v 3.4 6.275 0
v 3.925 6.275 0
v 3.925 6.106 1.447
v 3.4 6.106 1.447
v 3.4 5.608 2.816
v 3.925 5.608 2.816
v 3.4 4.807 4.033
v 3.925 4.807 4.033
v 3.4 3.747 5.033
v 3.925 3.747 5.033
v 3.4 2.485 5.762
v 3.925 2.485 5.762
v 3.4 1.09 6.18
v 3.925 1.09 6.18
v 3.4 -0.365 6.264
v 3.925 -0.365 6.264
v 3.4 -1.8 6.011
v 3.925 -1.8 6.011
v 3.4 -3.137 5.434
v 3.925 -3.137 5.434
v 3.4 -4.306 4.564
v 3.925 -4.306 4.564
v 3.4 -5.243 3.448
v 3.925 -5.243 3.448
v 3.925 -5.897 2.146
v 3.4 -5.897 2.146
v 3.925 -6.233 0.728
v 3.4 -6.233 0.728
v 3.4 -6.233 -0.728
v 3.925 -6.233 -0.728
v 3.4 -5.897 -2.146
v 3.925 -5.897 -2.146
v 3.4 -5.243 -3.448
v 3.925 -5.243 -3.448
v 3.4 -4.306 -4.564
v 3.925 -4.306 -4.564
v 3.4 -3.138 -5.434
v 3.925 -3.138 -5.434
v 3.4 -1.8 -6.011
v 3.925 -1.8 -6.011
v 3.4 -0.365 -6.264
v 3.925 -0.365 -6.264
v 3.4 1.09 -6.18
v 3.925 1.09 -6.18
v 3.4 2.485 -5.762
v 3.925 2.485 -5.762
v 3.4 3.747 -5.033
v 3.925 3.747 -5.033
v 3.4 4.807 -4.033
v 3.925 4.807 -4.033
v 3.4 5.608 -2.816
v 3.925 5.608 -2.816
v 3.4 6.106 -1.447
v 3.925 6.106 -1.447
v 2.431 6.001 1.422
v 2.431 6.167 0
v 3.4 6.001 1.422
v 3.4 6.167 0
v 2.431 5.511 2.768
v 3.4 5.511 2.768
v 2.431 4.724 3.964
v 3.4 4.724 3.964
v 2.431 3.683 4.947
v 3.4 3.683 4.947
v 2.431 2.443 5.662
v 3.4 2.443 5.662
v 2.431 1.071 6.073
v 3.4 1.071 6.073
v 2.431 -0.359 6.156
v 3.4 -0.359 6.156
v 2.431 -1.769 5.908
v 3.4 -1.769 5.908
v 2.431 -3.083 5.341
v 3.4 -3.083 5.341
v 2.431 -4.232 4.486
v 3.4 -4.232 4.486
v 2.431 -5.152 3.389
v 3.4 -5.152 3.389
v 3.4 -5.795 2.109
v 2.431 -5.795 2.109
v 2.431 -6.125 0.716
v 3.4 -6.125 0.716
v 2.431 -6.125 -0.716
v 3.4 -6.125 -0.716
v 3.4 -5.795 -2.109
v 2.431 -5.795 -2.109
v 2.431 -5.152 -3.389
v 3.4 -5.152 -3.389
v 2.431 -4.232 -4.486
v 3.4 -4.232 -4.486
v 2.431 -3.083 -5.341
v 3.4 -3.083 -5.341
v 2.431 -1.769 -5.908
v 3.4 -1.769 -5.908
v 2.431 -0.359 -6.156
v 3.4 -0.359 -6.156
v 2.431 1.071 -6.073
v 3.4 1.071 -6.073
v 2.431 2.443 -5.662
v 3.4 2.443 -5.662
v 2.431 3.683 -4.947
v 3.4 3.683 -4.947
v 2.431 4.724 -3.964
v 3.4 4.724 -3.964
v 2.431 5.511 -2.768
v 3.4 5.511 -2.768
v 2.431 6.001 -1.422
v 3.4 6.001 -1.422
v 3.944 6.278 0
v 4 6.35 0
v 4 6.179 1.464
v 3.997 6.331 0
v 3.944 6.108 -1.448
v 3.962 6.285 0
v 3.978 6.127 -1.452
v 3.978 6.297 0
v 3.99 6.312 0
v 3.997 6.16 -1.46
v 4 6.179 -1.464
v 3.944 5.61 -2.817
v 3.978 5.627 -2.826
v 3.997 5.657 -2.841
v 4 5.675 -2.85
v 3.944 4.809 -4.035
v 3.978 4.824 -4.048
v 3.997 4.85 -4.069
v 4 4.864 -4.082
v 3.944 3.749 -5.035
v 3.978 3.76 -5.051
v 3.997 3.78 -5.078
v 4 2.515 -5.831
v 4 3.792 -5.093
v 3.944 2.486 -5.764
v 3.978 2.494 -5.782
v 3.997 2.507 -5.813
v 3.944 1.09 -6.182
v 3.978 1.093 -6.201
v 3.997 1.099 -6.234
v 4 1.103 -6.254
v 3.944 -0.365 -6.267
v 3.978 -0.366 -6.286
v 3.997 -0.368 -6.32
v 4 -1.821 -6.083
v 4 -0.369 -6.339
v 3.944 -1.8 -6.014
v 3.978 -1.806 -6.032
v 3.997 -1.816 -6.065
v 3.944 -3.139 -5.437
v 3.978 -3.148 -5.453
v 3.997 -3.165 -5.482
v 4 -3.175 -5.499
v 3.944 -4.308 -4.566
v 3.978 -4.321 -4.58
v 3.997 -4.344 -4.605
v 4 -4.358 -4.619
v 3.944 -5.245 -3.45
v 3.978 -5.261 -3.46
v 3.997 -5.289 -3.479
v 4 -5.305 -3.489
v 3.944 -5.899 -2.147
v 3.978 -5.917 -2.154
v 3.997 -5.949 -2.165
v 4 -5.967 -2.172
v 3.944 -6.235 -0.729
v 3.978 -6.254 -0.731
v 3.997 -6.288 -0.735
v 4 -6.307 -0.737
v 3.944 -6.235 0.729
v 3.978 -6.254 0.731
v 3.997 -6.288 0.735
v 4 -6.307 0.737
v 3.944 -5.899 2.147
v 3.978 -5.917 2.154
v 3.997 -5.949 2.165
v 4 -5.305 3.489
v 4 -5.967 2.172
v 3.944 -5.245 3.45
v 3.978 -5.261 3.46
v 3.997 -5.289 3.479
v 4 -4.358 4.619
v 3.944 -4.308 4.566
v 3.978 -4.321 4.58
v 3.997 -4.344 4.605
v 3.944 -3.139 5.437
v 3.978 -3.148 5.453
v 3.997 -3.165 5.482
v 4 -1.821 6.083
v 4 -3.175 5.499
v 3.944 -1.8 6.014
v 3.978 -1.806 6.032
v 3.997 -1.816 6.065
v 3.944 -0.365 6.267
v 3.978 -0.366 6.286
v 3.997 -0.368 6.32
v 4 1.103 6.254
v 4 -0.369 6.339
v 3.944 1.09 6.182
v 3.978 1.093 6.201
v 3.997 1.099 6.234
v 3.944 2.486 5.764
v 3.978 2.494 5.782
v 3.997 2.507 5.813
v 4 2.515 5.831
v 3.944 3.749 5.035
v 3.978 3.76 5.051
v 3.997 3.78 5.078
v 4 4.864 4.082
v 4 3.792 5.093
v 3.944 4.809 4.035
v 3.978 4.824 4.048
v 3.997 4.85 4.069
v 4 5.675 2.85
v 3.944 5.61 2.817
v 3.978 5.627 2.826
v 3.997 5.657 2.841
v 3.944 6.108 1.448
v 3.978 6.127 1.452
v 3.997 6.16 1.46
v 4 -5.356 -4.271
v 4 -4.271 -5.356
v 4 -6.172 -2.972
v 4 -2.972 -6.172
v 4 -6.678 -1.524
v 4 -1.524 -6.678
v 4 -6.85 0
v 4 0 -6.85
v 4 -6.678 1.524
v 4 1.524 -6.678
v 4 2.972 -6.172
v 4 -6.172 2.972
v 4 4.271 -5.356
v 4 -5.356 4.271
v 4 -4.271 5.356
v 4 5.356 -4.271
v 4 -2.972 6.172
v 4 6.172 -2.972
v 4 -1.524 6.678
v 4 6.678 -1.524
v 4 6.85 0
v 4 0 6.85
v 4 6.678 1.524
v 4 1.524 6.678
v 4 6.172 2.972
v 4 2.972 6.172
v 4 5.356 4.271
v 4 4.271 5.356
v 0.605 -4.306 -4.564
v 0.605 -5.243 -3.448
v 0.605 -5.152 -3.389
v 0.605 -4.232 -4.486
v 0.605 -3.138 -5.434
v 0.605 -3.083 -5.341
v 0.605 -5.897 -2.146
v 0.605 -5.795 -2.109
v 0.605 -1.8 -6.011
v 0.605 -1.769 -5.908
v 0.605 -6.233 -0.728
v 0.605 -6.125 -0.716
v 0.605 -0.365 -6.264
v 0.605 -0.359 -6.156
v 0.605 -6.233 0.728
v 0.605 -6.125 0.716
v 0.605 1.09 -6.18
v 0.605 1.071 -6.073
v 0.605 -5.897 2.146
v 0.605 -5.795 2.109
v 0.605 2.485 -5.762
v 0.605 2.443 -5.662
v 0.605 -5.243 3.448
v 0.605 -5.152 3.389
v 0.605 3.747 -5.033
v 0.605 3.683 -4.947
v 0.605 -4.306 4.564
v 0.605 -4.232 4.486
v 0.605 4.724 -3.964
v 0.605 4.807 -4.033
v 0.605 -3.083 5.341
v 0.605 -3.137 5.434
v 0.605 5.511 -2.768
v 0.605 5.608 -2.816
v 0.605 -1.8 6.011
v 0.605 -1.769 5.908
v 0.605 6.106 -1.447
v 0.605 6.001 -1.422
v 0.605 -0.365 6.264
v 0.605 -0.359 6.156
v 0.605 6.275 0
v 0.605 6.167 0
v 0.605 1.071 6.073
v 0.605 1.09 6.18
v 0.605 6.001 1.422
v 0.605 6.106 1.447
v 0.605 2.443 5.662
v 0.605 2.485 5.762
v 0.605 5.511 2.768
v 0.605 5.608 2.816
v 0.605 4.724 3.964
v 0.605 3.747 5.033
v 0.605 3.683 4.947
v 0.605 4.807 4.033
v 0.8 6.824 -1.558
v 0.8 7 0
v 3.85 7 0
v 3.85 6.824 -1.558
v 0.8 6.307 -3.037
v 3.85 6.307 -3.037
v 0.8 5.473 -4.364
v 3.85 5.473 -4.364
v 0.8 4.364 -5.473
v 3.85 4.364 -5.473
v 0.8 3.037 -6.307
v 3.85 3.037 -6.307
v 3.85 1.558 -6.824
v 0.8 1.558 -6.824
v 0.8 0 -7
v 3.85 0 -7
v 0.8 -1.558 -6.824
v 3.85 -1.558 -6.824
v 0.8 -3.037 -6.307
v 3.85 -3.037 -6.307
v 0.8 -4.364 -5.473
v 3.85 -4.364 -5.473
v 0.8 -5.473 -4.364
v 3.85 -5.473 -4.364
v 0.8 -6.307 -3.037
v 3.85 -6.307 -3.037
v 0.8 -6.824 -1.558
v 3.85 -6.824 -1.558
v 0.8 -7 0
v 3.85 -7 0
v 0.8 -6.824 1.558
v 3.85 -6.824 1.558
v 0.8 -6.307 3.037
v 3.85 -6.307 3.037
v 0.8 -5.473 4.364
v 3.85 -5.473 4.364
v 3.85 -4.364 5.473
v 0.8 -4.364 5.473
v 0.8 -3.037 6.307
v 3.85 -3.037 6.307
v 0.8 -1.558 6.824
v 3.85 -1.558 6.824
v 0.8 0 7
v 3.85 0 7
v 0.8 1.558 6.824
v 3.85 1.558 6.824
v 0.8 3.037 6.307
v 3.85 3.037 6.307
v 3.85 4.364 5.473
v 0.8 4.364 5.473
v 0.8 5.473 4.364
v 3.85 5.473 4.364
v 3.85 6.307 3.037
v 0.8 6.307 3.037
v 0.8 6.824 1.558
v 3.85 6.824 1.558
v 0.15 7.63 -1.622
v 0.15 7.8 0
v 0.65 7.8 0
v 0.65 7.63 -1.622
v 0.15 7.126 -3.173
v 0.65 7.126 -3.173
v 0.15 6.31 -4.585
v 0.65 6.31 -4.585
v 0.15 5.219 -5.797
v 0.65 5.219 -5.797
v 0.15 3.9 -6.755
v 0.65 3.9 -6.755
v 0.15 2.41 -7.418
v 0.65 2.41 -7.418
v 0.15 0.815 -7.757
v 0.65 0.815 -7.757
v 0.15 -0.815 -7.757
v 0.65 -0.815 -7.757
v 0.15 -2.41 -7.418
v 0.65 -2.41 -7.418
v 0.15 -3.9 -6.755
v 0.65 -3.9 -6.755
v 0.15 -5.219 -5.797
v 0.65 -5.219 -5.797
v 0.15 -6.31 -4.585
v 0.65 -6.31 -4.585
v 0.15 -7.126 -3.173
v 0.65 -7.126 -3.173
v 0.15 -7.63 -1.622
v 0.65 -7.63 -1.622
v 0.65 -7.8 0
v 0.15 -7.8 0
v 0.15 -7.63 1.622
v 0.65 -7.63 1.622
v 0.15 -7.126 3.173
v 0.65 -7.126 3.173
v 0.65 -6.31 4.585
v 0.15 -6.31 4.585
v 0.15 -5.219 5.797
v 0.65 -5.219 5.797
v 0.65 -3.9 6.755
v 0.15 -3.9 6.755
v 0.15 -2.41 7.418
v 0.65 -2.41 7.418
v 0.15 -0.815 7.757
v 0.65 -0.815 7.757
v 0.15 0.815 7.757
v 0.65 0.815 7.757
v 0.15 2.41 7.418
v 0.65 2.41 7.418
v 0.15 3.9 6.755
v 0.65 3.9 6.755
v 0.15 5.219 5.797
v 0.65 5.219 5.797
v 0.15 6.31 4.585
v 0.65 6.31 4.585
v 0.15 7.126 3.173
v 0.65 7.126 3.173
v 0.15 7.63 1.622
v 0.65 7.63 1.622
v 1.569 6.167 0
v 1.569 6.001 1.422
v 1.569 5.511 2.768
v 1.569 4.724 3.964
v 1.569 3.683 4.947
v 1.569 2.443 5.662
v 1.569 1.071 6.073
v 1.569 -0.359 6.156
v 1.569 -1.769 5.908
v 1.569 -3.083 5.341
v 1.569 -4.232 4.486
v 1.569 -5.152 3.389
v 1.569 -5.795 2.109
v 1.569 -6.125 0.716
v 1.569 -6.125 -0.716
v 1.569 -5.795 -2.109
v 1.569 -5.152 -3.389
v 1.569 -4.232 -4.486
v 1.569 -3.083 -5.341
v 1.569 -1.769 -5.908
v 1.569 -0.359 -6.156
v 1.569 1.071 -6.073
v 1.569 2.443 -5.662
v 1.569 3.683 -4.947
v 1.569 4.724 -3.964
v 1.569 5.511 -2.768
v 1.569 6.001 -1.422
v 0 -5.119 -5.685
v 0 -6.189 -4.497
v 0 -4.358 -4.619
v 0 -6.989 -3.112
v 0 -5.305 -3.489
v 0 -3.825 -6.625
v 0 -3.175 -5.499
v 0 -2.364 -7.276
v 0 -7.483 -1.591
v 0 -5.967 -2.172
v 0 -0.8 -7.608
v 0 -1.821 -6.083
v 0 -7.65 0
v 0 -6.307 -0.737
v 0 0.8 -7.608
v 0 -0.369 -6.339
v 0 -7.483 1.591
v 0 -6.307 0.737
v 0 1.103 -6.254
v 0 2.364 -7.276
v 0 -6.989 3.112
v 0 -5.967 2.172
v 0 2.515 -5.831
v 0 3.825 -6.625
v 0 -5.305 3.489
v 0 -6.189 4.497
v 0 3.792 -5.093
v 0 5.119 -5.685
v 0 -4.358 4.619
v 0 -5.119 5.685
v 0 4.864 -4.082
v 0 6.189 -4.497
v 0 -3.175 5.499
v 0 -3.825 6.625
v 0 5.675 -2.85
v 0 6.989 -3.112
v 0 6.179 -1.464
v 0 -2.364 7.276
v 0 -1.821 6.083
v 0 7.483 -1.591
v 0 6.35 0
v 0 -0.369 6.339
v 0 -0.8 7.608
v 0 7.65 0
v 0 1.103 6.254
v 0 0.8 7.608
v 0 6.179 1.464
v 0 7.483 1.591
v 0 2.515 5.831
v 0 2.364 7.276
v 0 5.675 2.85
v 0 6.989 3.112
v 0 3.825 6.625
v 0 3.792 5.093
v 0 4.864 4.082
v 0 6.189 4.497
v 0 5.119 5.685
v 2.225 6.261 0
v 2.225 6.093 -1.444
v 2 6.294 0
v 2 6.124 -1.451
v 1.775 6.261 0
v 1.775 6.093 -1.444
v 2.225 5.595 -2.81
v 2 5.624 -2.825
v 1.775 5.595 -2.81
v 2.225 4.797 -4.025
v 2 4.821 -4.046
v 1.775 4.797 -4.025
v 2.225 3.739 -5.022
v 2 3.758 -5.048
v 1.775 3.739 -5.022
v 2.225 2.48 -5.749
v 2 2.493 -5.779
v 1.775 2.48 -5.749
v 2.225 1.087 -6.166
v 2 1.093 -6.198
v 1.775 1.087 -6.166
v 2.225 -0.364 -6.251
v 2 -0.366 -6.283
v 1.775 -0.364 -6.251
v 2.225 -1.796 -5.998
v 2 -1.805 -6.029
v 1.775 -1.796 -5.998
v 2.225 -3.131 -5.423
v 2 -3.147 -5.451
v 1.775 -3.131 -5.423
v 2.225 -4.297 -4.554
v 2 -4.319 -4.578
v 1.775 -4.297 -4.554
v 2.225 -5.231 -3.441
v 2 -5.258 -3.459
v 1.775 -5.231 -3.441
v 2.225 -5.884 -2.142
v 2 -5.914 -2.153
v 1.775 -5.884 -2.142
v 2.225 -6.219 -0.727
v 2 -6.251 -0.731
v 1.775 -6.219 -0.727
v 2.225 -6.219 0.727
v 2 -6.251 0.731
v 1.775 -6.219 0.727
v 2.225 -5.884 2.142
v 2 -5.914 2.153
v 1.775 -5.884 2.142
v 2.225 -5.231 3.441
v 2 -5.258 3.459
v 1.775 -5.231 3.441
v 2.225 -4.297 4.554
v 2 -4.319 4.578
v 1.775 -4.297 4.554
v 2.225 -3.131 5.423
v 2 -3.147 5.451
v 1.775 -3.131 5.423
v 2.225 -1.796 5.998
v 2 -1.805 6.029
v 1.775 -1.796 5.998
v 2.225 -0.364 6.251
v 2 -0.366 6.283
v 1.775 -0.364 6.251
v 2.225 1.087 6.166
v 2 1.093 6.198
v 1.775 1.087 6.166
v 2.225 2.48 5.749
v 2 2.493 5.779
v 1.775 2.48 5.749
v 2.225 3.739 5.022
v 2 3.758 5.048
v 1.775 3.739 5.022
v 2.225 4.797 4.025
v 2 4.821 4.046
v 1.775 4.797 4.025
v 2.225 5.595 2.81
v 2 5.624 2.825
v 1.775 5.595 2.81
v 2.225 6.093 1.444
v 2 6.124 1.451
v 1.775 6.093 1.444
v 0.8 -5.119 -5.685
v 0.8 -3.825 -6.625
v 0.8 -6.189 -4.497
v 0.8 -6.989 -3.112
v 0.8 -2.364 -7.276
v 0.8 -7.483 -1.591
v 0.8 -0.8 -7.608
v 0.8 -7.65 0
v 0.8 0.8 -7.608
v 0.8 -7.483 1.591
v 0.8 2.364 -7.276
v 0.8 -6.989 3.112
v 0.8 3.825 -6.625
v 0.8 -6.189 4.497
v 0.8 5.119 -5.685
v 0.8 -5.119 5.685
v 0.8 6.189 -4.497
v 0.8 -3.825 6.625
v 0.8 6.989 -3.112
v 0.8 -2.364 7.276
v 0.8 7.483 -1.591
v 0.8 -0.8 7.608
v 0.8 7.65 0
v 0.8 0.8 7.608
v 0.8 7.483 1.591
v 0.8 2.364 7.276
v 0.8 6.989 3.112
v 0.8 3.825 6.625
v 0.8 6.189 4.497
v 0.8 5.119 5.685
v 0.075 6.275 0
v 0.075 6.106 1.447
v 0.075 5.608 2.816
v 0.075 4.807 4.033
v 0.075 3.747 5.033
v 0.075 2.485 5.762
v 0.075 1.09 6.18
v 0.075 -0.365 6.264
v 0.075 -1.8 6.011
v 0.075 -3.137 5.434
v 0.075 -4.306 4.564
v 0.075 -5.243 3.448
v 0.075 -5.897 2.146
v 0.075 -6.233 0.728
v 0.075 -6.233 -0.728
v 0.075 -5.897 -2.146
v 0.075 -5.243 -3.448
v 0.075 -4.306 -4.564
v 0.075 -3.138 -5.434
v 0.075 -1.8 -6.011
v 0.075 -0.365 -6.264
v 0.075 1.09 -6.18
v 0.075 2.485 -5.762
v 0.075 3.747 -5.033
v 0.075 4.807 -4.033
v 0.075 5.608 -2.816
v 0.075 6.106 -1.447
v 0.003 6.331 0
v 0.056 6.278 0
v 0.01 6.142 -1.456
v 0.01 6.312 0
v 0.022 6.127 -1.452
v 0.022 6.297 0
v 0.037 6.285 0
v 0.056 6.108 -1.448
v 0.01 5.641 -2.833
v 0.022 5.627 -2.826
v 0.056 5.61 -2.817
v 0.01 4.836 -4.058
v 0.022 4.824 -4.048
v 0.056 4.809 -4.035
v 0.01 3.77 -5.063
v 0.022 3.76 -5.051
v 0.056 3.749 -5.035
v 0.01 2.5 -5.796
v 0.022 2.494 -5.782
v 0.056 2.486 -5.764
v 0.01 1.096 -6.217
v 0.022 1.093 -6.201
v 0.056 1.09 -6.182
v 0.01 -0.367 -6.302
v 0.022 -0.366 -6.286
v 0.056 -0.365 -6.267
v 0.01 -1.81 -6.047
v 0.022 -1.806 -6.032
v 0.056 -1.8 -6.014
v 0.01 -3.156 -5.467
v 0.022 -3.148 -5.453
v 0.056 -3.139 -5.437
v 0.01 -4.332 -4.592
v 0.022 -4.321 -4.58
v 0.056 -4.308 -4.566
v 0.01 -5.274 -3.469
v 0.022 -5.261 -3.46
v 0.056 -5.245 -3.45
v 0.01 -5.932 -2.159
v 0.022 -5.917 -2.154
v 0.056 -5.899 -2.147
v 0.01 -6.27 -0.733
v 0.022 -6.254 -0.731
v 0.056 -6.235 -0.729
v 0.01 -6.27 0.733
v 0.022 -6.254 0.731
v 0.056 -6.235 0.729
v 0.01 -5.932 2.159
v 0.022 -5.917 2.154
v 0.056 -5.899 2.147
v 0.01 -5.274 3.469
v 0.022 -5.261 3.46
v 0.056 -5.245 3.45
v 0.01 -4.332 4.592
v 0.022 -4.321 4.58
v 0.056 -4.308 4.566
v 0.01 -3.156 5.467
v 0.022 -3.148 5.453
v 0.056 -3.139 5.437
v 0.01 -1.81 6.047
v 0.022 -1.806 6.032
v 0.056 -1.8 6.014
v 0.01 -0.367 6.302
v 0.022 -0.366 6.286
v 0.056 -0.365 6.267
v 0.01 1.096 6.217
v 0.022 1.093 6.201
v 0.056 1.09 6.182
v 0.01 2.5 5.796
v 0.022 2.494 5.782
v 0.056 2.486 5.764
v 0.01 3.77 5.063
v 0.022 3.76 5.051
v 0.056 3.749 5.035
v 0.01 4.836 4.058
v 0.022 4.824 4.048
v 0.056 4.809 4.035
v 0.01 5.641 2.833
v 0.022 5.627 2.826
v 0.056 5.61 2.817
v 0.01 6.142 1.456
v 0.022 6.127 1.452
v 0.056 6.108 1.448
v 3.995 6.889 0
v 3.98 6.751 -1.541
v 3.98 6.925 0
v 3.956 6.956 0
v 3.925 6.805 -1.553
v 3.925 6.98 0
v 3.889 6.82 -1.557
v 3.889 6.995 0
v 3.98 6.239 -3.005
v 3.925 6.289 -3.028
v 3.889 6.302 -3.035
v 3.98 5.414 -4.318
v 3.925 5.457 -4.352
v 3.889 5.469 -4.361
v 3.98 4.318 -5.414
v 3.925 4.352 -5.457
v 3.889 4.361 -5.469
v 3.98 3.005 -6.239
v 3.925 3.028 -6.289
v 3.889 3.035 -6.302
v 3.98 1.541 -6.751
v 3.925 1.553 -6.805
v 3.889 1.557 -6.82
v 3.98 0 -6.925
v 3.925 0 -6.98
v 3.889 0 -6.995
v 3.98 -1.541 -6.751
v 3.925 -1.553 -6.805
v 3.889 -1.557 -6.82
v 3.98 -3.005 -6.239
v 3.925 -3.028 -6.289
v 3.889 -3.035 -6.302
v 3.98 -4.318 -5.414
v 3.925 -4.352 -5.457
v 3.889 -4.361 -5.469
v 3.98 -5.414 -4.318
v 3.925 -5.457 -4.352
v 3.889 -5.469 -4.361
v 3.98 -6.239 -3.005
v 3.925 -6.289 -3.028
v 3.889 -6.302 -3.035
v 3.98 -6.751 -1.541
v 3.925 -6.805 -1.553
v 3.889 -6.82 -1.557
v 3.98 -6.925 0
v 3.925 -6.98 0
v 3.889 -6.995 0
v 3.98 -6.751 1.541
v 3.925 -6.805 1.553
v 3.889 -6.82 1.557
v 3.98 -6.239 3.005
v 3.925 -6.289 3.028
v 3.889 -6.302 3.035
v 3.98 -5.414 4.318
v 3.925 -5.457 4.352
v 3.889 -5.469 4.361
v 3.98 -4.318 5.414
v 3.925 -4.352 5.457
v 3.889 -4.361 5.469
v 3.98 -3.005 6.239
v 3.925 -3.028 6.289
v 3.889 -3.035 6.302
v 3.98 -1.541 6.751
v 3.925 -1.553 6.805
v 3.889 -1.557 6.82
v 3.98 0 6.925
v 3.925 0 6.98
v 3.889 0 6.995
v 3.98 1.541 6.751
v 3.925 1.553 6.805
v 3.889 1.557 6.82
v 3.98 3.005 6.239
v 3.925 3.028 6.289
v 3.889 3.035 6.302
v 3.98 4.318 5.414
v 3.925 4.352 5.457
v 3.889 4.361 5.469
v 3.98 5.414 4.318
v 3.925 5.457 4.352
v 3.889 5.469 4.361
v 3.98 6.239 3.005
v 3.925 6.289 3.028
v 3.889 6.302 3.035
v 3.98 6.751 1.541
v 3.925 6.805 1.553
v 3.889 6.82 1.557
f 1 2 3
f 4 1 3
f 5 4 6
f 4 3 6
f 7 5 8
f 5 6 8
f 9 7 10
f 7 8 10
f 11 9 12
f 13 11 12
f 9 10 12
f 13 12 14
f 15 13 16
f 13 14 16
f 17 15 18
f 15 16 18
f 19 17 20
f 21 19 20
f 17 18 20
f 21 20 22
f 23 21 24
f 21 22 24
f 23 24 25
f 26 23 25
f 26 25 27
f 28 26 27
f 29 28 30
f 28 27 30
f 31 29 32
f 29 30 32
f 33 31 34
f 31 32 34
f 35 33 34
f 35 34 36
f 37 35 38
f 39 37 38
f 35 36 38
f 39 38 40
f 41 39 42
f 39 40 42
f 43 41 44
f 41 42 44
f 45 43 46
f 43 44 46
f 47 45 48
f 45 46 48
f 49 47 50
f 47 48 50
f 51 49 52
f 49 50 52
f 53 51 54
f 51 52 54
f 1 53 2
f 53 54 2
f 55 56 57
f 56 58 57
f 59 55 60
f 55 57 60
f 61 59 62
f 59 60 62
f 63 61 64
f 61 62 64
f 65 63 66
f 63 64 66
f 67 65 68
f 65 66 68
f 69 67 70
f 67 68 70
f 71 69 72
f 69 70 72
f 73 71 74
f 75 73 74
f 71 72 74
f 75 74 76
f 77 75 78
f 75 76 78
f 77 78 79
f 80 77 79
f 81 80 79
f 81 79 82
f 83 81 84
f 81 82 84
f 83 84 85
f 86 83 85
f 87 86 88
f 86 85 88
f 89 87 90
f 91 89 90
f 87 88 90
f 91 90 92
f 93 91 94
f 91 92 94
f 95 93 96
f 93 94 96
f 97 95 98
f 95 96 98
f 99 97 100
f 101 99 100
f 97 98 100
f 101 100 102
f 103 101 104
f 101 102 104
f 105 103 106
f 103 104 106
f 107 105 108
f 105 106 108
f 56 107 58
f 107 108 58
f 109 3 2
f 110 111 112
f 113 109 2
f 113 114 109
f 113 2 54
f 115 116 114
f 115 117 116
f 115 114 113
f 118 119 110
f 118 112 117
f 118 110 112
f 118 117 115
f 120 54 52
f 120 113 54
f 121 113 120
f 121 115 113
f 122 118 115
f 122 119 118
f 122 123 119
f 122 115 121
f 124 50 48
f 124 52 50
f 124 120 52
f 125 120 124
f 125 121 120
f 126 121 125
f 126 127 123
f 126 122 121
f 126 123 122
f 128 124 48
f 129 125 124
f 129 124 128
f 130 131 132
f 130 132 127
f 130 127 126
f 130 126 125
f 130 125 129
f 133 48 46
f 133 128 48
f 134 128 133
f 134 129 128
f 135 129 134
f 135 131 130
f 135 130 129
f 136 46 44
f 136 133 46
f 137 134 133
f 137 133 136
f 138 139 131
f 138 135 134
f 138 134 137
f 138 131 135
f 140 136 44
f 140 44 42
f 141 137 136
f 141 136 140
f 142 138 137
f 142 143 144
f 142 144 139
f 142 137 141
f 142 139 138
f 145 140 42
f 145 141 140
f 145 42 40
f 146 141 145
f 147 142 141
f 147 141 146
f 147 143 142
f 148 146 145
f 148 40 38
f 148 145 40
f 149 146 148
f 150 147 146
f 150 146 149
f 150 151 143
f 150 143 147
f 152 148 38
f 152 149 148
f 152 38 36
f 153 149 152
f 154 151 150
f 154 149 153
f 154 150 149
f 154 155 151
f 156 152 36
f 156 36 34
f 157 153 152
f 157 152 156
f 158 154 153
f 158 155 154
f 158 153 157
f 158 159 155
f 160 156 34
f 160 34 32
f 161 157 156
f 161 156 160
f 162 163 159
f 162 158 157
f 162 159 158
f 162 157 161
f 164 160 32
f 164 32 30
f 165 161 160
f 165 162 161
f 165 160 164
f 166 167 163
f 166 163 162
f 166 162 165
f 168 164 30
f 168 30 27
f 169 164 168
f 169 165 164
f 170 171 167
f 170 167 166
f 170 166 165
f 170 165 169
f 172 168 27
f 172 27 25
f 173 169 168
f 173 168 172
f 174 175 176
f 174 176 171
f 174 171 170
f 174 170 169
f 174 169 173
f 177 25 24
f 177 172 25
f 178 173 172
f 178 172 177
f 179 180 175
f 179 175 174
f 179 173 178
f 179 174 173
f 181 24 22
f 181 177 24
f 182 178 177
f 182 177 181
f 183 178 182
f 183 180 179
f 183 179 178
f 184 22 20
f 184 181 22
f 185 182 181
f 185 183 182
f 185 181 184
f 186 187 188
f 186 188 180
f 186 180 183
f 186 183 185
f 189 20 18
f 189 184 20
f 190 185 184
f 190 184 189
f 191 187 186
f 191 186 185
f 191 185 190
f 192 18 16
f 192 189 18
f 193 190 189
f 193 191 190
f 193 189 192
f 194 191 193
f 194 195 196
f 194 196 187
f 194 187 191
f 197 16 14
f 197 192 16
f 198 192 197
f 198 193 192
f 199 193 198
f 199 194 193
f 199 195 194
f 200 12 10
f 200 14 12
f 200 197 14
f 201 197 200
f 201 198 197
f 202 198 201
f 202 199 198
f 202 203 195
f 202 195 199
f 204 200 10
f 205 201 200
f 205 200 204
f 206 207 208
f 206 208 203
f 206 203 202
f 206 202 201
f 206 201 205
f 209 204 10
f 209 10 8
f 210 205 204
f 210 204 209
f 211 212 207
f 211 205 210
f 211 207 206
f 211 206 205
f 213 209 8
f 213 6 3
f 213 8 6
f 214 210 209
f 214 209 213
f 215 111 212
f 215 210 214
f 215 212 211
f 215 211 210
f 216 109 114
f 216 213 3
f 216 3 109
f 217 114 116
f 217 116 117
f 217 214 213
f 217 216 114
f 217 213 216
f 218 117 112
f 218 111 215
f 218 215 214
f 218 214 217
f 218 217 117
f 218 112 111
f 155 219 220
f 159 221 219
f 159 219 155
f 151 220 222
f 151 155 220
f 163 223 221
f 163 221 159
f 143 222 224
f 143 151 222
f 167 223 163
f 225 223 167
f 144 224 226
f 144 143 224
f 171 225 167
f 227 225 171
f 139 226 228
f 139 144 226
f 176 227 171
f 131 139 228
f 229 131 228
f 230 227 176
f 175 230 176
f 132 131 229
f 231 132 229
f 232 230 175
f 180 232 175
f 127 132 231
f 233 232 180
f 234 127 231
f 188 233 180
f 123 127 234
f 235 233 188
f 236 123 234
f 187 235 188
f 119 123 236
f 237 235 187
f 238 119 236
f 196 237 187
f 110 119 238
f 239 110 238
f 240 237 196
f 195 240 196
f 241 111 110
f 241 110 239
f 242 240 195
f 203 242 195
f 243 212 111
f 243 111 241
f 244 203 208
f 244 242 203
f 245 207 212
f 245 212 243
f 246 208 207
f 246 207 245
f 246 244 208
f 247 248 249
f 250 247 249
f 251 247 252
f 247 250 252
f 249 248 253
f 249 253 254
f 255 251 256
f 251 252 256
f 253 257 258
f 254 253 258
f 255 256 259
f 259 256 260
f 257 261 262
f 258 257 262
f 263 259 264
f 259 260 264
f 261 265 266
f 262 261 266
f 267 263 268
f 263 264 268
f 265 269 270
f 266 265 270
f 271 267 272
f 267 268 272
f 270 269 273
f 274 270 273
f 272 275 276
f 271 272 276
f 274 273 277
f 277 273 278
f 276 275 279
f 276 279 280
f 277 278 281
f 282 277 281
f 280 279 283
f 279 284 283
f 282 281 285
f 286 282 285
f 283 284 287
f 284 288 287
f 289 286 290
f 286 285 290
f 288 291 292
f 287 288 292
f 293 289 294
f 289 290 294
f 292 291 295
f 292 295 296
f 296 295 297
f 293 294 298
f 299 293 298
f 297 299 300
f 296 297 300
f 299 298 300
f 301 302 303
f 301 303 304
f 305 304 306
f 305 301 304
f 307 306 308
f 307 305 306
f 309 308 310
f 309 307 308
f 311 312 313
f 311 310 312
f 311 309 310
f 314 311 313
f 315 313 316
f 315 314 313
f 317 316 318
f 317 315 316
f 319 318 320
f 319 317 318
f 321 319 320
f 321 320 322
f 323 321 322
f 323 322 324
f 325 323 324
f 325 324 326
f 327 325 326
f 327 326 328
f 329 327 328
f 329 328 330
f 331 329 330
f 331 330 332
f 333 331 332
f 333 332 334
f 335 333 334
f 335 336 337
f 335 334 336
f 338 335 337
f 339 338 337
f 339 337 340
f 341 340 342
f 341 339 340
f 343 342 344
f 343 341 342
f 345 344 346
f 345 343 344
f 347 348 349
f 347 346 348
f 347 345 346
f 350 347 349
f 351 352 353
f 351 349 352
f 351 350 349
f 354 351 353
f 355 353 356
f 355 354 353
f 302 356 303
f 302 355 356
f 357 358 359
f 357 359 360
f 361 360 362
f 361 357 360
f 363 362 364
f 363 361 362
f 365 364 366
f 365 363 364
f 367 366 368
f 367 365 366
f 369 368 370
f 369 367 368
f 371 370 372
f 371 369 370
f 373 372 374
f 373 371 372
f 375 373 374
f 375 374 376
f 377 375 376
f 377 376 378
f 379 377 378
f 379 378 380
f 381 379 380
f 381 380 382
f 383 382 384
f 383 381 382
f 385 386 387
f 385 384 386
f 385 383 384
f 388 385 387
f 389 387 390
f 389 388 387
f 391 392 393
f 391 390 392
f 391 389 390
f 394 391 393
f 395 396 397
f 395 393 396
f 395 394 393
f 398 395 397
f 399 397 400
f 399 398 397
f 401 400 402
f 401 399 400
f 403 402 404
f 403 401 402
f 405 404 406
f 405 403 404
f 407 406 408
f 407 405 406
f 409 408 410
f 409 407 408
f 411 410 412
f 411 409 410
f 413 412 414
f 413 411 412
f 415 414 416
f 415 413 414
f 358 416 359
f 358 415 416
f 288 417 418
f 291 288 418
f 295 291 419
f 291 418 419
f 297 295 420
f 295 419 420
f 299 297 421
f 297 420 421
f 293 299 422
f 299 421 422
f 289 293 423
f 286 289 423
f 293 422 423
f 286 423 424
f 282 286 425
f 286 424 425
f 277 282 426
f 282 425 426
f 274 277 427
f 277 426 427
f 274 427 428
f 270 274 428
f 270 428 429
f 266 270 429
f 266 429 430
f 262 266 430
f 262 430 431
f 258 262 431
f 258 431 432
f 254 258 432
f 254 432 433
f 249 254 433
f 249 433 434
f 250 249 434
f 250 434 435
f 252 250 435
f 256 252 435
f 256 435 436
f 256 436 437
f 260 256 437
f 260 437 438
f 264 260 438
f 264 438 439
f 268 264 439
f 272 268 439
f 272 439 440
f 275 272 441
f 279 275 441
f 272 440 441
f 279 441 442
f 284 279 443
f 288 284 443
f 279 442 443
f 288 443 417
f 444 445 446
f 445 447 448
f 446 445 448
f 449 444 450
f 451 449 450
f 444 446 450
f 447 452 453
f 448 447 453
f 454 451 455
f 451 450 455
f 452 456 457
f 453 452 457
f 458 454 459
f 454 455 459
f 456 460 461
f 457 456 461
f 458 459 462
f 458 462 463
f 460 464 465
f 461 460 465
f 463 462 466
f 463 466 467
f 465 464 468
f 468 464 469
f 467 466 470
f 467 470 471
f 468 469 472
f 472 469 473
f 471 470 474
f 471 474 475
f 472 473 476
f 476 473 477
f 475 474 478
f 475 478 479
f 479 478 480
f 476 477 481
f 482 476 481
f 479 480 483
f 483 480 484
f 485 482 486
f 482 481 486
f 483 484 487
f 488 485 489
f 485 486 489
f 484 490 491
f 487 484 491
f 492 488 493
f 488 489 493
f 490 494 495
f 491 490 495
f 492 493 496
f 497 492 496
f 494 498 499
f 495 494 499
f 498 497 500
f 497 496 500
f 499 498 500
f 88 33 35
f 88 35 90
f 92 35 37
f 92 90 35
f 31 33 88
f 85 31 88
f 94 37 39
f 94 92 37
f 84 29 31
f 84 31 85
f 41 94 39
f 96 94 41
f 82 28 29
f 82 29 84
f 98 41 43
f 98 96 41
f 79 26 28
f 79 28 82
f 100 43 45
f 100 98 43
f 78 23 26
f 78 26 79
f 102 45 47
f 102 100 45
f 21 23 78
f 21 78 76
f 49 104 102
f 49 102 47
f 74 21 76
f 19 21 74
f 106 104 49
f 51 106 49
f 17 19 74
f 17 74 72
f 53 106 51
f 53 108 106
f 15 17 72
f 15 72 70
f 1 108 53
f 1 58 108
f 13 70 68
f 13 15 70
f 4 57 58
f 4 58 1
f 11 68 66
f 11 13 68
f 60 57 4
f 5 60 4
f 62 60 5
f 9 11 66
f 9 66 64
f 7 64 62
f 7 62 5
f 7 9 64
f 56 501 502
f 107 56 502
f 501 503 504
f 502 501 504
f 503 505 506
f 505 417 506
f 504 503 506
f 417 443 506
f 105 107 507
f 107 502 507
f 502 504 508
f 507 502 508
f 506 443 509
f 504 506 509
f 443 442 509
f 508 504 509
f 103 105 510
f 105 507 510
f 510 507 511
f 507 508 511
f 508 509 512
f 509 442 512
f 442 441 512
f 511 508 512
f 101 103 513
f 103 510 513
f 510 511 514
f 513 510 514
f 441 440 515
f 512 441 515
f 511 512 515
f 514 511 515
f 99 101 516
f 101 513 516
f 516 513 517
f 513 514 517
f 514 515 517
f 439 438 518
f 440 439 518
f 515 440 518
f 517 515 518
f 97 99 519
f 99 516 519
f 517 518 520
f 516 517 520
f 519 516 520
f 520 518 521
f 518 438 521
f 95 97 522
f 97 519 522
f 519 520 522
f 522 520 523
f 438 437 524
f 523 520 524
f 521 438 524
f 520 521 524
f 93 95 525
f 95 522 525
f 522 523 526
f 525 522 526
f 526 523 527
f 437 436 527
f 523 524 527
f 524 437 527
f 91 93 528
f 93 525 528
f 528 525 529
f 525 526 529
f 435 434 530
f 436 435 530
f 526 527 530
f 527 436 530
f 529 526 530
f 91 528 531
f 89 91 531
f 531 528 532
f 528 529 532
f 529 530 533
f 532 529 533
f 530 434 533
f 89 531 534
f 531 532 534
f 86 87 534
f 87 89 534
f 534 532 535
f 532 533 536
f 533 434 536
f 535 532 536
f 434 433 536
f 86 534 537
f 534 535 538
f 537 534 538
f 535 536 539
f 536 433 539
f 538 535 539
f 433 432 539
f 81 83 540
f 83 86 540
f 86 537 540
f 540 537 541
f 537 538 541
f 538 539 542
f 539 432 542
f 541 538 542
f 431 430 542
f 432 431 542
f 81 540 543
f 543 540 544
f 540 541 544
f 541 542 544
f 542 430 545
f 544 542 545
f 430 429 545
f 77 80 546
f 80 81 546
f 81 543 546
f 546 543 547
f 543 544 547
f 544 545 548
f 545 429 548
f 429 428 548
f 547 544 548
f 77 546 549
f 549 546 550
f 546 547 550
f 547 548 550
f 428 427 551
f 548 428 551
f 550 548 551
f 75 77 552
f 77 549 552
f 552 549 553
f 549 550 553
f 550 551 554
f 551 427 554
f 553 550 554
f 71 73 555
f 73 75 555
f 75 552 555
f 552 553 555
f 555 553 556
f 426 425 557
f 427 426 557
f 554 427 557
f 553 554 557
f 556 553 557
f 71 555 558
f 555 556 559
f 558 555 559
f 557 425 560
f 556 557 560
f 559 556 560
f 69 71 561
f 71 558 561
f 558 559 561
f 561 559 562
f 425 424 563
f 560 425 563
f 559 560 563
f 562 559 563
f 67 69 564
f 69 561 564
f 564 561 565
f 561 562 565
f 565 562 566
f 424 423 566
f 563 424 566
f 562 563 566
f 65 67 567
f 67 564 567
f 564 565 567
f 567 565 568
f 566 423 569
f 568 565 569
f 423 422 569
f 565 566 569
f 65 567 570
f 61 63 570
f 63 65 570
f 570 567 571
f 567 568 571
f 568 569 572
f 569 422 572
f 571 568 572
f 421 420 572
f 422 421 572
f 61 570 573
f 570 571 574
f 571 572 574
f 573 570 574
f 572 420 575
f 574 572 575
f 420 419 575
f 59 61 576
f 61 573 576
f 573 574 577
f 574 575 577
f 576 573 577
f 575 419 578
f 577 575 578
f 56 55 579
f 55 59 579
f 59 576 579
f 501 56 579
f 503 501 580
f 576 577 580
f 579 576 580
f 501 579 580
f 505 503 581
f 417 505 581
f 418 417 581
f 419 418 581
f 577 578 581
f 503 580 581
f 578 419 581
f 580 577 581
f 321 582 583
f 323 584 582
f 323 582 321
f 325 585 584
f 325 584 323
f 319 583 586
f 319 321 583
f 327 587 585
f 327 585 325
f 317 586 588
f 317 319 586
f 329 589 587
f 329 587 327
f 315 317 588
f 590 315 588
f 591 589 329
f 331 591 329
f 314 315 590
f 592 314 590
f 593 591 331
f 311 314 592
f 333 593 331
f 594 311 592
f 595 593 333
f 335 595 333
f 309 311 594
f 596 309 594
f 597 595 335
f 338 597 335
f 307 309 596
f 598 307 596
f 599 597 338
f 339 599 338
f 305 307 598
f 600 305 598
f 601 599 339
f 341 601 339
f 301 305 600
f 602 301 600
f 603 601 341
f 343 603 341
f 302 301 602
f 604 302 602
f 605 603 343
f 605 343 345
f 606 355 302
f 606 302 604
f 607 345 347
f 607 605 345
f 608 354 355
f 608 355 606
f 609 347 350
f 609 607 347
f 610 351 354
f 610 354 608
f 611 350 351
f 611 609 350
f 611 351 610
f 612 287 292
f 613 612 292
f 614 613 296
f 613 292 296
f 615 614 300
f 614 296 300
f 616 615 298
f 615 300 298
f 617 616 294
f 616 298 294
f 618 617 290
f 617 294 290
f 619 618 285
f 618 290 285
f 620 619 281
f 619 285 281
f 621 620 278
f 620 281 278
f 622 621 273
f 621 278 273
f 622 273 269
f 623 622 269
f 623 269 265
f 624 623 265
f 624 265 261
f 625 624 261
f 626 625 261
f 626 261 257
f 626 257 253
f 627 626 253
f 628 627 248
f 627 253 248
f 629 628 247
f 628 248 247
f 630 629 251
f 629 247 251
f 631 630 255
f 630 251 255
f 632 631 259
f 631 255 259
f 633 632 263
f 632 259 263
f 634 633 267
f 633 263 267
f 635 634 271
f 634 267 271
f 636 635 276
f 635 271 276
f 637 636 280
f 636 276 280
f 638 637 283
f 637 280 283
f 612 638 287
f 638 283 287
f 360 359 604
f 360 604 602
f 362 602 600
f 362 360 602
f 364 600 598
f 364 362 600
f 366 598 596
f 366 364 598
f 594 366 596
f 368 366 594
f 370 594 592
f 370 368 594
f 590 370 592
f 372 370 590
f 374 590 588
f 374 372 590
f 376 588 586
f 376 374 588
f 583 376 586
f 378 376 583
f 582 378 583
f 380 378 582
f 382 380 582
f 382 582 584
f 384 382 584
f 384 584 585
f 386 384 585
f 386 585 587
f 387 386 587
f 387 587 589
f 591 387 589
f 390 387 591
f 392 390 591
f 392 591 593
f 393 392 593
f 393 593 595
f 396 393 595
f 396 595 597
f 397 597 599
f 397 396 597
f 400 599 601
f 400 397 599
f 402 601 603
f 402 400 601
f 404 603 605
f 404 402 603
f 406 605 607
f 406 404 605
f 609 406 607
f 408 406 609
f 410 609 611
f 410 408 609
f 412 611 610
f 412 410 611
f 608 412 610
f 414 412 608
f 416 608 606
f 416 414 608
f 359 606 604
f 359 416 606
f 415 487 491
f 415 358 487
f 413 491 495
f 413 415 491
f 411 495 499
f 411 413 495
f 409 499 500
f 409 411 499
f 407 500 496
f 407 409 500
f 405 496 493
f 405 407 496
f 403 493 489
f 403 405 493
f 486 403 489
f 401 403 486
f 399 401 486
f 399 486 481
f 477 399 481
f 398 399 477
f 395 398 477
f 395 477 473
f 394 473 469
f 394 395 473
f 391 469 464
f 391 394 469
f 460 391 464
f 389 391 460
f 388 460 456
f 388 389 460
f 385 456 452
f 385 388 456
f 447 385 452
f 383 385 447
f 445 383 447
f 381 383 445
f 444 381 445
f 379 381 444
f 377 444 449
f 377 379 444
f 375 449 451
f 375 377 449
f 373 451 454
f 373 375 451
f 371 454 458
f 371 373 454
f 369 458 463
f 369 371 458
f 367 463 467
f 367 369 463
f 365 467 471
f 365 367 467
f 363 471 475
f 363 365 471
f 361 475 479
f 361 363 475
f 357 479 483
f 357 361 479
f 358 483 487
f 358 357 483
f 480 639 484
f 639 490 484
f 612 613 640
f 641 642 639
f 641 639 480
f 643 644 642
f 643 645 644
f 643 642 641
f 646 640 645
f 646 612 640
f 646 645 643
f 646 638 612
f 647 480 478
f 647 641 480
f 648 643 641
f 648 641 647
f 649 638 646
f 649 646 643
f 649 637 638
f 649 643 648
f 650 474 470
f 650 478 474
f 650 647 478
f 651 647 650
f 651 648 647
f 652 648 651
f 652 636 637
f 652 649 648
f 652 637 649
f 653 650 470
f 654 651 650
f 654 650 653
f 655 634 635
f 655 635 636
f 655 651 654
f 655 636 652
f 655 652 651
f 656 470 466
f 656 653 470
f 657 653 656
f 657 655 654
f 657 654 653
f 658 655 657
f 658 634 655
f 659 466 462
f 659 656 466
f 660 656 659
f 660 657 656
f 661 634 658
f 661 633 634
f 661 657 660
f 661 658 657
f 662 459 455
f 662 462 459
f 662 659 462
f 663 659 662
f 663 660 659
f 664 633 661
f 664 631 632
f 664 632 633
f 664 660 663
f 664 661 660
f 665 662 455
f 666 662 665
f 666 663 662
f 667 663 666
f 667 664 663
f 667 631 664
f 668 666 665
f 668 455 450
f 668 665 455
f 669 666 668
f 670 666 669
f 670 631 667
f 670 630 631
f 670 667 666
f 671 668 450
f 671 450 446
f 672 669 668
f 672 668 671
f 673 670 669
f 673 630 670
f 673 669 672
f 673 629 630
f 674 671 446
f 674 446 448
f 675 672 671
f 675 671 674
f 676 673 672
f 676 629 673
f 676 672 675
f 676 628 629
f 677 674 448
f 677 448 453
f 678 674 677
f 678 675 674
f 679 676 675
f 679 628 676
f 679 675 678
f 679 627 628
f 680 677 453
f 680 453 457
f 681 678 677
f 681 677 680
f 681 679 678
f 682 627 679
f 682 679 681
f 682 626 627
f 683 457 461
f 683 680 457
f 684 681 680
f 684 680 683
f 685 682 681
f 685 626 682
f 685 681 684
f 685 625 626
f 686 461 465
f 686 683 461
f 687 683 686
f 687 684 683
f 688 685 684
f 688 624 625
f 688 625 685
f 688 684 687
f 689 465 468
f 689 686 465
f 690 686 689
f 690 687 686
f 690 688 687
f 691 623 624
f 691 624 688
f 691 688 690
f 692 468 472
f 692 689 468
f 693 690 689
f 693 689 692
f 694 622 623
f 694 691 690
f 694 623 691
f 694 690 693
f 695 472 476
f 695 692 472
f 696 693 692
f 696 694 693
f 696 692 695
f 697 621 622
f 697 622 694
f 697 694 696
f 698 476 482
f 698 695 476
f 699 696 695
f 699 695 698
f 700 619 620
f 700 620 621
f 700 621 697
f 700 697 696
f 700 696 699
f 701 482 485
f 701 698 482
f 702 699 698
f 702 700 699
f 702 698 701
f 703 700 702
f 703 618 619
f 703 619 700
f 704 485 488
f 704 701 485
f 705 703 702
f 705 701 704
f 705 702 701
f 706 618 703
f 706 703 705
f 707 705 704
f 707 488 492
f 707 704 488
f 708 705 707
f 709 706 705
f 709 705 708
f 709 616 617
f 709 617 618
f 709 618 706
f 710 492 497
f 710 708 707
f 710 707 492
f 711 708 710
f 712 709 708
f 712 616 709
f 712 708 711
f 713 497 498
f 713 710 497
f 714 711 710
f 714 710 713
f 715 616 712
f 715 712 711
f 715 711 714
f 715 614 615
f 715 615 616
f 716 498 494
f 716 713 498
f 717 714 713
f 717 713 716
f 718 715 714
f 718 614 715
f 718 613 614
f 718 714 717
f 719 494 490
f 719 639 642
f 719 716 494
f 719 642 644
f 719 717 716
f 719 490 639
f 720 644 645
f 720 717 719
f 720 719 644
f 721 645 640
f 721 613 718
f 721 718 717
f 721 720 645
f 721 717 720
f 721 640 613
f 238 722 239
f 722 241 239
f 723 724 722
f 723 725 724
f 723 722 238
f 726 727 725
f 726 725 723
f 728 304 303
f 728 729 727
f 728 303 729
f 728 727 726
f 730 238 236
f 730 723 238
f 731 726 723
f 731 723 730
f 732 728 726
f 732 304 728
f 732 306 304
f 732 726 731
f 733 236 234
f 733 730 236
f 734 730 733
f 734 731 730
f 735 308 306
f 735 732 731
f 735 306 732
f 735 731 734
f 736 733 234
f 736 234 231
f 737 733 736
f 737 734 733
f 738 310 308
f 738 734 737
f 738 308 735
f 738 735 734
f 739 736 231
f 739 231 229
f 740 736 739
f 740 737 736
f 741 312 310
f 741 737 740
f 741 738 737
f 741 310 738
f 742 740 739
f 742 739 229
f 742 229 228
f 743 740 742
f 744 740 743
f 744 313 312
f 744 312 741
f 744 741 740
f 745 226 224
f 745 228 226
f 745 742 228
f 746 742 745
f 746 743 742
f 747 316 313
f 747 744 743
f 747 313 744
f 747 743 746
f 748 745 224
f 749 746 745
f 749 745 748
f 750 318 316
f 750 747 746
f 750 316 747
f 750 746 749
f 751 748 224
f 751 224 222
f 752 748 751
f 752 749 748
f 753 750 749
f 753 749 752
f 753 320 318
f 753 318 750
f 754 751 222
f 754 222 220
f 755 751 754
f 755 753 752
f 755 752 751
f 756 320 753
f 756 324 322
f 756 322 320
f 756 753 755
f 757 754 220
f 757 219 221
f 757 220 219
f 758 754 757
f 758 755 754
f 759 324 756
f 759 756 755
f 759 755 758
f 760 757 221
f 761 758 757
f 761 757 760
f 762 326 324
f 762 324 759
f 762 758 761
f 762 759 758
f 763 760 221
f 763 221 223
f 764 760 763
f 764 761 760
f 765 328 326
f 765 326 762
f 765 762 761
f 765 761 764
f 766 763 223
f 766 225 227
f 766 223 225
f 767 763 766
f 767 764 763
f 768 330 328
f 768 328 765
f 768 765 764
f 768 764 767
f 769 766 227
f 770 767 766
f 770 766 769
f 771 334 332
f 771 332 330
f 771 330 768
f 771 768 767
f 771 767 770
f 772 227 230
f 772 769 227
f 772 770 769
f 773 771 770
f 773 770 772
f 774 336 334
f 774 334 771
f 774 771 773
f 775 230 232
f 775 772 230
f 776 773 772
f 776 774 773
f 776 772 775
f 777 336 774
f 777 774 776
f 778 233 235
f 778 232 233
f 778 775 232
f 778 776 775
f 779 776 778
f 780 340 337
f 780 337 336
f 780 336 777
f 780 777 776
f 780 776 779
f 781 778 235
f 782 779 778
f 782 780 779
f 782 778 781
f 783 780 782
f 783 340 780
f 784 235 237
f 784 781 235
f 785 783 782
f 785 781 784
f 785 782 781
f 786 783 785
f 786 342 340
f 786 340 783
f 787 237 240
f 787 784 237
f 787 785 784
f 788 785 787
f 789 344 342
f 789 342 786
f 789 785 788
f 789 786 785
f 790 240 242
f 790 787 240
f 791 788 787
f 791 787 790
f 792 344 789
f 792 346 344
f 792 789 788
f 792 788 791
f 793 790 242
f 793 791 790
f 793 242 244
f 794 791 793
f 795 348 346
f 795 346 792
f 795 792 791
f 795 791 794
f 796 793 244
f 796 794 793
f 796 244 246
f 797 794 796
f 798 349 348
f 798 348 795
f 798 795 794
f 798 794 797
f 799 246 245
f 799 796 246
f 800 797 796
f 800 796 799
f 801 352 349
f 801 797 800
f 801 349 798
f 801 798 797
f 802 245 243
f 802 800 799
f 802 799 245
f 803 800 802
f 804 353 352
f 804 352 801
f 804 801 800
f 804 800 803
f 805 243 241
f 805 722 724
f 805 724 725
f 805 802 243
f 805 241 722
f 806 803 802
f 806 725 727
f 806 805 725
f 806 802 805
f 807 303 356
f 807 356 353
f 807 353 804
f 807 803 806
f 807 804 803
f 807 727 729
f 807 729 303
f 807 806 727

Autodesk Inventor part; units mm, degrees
sketch "Sketch_3" plane through (0, 0, 0) normal (0, 0, 1) x (1, 0, 0)
  line L0 (3.85, 0) -> (0, 0)
  line L1 (0, 7.65) -> (0, 6.35)
  arc A0 (0, 6.35) -> (0.075, 6.275) centre (0.075, 6.35) ccw
  line L2 (0.075, 6.275) -> (0.605, 6.275)
  line L3 (0.605, 6.275) -> (0.605, 6.1668)
  line L4 (0.605, 6.1668) -> (1.5693, 6.1668)
  arc A1 (2.4307, 6.1668) -> (1.5693, 6.1668) centre (2, 5.5) ccw
  line L5 (2.4307, 6.1668) -> (3.4, 6.1668)
  line L6 (3.4, 6.1668) -> (3.4, 6.275)
  line L7 (3.4, 6.275) -> (3.925, 6.275)
  arc A2 (3.925, 6.275) -> (4, 6.35) centre (3.925, 6.35) ccw
  line L8 (4, 6.35) -> (4, 6.85)
  arc A3 (4, 6.85) -> (3.85, 7) centre (3.85, 6.85) ccw
  line L9 (3.85, 7) -> (0.8, 7)
  line L10 (0.8, 7) -> (0.8, 7.65)
  line L11 (0.8, 7.65) -> (0.65, 7.8)
  line L12 (0.65, 7.8) -> (0.15, 7.8)
  line L13 (0.15, 7.8) -> (0, 7.65)
revolve "Revolution1" add sketch "Sketch_3" angle 360 about axis through (3.85, 0, 0) along (1, 0, 0)
ref_plane "1_XY" through (2, 0, 0) normal (1, 0, 0) x (0, 0, -1)
ref_plane "1_YZ" through (2, 0, 0) normal (0, 0, -1) x (0, 1, 0)
ref_plane "1_ZX" through (2, 0, 0) normal (0, 1, 0) x (1, 0, 0)
properties part number "LF-1480ZZ_or" material "鋼、炭素鋼"
